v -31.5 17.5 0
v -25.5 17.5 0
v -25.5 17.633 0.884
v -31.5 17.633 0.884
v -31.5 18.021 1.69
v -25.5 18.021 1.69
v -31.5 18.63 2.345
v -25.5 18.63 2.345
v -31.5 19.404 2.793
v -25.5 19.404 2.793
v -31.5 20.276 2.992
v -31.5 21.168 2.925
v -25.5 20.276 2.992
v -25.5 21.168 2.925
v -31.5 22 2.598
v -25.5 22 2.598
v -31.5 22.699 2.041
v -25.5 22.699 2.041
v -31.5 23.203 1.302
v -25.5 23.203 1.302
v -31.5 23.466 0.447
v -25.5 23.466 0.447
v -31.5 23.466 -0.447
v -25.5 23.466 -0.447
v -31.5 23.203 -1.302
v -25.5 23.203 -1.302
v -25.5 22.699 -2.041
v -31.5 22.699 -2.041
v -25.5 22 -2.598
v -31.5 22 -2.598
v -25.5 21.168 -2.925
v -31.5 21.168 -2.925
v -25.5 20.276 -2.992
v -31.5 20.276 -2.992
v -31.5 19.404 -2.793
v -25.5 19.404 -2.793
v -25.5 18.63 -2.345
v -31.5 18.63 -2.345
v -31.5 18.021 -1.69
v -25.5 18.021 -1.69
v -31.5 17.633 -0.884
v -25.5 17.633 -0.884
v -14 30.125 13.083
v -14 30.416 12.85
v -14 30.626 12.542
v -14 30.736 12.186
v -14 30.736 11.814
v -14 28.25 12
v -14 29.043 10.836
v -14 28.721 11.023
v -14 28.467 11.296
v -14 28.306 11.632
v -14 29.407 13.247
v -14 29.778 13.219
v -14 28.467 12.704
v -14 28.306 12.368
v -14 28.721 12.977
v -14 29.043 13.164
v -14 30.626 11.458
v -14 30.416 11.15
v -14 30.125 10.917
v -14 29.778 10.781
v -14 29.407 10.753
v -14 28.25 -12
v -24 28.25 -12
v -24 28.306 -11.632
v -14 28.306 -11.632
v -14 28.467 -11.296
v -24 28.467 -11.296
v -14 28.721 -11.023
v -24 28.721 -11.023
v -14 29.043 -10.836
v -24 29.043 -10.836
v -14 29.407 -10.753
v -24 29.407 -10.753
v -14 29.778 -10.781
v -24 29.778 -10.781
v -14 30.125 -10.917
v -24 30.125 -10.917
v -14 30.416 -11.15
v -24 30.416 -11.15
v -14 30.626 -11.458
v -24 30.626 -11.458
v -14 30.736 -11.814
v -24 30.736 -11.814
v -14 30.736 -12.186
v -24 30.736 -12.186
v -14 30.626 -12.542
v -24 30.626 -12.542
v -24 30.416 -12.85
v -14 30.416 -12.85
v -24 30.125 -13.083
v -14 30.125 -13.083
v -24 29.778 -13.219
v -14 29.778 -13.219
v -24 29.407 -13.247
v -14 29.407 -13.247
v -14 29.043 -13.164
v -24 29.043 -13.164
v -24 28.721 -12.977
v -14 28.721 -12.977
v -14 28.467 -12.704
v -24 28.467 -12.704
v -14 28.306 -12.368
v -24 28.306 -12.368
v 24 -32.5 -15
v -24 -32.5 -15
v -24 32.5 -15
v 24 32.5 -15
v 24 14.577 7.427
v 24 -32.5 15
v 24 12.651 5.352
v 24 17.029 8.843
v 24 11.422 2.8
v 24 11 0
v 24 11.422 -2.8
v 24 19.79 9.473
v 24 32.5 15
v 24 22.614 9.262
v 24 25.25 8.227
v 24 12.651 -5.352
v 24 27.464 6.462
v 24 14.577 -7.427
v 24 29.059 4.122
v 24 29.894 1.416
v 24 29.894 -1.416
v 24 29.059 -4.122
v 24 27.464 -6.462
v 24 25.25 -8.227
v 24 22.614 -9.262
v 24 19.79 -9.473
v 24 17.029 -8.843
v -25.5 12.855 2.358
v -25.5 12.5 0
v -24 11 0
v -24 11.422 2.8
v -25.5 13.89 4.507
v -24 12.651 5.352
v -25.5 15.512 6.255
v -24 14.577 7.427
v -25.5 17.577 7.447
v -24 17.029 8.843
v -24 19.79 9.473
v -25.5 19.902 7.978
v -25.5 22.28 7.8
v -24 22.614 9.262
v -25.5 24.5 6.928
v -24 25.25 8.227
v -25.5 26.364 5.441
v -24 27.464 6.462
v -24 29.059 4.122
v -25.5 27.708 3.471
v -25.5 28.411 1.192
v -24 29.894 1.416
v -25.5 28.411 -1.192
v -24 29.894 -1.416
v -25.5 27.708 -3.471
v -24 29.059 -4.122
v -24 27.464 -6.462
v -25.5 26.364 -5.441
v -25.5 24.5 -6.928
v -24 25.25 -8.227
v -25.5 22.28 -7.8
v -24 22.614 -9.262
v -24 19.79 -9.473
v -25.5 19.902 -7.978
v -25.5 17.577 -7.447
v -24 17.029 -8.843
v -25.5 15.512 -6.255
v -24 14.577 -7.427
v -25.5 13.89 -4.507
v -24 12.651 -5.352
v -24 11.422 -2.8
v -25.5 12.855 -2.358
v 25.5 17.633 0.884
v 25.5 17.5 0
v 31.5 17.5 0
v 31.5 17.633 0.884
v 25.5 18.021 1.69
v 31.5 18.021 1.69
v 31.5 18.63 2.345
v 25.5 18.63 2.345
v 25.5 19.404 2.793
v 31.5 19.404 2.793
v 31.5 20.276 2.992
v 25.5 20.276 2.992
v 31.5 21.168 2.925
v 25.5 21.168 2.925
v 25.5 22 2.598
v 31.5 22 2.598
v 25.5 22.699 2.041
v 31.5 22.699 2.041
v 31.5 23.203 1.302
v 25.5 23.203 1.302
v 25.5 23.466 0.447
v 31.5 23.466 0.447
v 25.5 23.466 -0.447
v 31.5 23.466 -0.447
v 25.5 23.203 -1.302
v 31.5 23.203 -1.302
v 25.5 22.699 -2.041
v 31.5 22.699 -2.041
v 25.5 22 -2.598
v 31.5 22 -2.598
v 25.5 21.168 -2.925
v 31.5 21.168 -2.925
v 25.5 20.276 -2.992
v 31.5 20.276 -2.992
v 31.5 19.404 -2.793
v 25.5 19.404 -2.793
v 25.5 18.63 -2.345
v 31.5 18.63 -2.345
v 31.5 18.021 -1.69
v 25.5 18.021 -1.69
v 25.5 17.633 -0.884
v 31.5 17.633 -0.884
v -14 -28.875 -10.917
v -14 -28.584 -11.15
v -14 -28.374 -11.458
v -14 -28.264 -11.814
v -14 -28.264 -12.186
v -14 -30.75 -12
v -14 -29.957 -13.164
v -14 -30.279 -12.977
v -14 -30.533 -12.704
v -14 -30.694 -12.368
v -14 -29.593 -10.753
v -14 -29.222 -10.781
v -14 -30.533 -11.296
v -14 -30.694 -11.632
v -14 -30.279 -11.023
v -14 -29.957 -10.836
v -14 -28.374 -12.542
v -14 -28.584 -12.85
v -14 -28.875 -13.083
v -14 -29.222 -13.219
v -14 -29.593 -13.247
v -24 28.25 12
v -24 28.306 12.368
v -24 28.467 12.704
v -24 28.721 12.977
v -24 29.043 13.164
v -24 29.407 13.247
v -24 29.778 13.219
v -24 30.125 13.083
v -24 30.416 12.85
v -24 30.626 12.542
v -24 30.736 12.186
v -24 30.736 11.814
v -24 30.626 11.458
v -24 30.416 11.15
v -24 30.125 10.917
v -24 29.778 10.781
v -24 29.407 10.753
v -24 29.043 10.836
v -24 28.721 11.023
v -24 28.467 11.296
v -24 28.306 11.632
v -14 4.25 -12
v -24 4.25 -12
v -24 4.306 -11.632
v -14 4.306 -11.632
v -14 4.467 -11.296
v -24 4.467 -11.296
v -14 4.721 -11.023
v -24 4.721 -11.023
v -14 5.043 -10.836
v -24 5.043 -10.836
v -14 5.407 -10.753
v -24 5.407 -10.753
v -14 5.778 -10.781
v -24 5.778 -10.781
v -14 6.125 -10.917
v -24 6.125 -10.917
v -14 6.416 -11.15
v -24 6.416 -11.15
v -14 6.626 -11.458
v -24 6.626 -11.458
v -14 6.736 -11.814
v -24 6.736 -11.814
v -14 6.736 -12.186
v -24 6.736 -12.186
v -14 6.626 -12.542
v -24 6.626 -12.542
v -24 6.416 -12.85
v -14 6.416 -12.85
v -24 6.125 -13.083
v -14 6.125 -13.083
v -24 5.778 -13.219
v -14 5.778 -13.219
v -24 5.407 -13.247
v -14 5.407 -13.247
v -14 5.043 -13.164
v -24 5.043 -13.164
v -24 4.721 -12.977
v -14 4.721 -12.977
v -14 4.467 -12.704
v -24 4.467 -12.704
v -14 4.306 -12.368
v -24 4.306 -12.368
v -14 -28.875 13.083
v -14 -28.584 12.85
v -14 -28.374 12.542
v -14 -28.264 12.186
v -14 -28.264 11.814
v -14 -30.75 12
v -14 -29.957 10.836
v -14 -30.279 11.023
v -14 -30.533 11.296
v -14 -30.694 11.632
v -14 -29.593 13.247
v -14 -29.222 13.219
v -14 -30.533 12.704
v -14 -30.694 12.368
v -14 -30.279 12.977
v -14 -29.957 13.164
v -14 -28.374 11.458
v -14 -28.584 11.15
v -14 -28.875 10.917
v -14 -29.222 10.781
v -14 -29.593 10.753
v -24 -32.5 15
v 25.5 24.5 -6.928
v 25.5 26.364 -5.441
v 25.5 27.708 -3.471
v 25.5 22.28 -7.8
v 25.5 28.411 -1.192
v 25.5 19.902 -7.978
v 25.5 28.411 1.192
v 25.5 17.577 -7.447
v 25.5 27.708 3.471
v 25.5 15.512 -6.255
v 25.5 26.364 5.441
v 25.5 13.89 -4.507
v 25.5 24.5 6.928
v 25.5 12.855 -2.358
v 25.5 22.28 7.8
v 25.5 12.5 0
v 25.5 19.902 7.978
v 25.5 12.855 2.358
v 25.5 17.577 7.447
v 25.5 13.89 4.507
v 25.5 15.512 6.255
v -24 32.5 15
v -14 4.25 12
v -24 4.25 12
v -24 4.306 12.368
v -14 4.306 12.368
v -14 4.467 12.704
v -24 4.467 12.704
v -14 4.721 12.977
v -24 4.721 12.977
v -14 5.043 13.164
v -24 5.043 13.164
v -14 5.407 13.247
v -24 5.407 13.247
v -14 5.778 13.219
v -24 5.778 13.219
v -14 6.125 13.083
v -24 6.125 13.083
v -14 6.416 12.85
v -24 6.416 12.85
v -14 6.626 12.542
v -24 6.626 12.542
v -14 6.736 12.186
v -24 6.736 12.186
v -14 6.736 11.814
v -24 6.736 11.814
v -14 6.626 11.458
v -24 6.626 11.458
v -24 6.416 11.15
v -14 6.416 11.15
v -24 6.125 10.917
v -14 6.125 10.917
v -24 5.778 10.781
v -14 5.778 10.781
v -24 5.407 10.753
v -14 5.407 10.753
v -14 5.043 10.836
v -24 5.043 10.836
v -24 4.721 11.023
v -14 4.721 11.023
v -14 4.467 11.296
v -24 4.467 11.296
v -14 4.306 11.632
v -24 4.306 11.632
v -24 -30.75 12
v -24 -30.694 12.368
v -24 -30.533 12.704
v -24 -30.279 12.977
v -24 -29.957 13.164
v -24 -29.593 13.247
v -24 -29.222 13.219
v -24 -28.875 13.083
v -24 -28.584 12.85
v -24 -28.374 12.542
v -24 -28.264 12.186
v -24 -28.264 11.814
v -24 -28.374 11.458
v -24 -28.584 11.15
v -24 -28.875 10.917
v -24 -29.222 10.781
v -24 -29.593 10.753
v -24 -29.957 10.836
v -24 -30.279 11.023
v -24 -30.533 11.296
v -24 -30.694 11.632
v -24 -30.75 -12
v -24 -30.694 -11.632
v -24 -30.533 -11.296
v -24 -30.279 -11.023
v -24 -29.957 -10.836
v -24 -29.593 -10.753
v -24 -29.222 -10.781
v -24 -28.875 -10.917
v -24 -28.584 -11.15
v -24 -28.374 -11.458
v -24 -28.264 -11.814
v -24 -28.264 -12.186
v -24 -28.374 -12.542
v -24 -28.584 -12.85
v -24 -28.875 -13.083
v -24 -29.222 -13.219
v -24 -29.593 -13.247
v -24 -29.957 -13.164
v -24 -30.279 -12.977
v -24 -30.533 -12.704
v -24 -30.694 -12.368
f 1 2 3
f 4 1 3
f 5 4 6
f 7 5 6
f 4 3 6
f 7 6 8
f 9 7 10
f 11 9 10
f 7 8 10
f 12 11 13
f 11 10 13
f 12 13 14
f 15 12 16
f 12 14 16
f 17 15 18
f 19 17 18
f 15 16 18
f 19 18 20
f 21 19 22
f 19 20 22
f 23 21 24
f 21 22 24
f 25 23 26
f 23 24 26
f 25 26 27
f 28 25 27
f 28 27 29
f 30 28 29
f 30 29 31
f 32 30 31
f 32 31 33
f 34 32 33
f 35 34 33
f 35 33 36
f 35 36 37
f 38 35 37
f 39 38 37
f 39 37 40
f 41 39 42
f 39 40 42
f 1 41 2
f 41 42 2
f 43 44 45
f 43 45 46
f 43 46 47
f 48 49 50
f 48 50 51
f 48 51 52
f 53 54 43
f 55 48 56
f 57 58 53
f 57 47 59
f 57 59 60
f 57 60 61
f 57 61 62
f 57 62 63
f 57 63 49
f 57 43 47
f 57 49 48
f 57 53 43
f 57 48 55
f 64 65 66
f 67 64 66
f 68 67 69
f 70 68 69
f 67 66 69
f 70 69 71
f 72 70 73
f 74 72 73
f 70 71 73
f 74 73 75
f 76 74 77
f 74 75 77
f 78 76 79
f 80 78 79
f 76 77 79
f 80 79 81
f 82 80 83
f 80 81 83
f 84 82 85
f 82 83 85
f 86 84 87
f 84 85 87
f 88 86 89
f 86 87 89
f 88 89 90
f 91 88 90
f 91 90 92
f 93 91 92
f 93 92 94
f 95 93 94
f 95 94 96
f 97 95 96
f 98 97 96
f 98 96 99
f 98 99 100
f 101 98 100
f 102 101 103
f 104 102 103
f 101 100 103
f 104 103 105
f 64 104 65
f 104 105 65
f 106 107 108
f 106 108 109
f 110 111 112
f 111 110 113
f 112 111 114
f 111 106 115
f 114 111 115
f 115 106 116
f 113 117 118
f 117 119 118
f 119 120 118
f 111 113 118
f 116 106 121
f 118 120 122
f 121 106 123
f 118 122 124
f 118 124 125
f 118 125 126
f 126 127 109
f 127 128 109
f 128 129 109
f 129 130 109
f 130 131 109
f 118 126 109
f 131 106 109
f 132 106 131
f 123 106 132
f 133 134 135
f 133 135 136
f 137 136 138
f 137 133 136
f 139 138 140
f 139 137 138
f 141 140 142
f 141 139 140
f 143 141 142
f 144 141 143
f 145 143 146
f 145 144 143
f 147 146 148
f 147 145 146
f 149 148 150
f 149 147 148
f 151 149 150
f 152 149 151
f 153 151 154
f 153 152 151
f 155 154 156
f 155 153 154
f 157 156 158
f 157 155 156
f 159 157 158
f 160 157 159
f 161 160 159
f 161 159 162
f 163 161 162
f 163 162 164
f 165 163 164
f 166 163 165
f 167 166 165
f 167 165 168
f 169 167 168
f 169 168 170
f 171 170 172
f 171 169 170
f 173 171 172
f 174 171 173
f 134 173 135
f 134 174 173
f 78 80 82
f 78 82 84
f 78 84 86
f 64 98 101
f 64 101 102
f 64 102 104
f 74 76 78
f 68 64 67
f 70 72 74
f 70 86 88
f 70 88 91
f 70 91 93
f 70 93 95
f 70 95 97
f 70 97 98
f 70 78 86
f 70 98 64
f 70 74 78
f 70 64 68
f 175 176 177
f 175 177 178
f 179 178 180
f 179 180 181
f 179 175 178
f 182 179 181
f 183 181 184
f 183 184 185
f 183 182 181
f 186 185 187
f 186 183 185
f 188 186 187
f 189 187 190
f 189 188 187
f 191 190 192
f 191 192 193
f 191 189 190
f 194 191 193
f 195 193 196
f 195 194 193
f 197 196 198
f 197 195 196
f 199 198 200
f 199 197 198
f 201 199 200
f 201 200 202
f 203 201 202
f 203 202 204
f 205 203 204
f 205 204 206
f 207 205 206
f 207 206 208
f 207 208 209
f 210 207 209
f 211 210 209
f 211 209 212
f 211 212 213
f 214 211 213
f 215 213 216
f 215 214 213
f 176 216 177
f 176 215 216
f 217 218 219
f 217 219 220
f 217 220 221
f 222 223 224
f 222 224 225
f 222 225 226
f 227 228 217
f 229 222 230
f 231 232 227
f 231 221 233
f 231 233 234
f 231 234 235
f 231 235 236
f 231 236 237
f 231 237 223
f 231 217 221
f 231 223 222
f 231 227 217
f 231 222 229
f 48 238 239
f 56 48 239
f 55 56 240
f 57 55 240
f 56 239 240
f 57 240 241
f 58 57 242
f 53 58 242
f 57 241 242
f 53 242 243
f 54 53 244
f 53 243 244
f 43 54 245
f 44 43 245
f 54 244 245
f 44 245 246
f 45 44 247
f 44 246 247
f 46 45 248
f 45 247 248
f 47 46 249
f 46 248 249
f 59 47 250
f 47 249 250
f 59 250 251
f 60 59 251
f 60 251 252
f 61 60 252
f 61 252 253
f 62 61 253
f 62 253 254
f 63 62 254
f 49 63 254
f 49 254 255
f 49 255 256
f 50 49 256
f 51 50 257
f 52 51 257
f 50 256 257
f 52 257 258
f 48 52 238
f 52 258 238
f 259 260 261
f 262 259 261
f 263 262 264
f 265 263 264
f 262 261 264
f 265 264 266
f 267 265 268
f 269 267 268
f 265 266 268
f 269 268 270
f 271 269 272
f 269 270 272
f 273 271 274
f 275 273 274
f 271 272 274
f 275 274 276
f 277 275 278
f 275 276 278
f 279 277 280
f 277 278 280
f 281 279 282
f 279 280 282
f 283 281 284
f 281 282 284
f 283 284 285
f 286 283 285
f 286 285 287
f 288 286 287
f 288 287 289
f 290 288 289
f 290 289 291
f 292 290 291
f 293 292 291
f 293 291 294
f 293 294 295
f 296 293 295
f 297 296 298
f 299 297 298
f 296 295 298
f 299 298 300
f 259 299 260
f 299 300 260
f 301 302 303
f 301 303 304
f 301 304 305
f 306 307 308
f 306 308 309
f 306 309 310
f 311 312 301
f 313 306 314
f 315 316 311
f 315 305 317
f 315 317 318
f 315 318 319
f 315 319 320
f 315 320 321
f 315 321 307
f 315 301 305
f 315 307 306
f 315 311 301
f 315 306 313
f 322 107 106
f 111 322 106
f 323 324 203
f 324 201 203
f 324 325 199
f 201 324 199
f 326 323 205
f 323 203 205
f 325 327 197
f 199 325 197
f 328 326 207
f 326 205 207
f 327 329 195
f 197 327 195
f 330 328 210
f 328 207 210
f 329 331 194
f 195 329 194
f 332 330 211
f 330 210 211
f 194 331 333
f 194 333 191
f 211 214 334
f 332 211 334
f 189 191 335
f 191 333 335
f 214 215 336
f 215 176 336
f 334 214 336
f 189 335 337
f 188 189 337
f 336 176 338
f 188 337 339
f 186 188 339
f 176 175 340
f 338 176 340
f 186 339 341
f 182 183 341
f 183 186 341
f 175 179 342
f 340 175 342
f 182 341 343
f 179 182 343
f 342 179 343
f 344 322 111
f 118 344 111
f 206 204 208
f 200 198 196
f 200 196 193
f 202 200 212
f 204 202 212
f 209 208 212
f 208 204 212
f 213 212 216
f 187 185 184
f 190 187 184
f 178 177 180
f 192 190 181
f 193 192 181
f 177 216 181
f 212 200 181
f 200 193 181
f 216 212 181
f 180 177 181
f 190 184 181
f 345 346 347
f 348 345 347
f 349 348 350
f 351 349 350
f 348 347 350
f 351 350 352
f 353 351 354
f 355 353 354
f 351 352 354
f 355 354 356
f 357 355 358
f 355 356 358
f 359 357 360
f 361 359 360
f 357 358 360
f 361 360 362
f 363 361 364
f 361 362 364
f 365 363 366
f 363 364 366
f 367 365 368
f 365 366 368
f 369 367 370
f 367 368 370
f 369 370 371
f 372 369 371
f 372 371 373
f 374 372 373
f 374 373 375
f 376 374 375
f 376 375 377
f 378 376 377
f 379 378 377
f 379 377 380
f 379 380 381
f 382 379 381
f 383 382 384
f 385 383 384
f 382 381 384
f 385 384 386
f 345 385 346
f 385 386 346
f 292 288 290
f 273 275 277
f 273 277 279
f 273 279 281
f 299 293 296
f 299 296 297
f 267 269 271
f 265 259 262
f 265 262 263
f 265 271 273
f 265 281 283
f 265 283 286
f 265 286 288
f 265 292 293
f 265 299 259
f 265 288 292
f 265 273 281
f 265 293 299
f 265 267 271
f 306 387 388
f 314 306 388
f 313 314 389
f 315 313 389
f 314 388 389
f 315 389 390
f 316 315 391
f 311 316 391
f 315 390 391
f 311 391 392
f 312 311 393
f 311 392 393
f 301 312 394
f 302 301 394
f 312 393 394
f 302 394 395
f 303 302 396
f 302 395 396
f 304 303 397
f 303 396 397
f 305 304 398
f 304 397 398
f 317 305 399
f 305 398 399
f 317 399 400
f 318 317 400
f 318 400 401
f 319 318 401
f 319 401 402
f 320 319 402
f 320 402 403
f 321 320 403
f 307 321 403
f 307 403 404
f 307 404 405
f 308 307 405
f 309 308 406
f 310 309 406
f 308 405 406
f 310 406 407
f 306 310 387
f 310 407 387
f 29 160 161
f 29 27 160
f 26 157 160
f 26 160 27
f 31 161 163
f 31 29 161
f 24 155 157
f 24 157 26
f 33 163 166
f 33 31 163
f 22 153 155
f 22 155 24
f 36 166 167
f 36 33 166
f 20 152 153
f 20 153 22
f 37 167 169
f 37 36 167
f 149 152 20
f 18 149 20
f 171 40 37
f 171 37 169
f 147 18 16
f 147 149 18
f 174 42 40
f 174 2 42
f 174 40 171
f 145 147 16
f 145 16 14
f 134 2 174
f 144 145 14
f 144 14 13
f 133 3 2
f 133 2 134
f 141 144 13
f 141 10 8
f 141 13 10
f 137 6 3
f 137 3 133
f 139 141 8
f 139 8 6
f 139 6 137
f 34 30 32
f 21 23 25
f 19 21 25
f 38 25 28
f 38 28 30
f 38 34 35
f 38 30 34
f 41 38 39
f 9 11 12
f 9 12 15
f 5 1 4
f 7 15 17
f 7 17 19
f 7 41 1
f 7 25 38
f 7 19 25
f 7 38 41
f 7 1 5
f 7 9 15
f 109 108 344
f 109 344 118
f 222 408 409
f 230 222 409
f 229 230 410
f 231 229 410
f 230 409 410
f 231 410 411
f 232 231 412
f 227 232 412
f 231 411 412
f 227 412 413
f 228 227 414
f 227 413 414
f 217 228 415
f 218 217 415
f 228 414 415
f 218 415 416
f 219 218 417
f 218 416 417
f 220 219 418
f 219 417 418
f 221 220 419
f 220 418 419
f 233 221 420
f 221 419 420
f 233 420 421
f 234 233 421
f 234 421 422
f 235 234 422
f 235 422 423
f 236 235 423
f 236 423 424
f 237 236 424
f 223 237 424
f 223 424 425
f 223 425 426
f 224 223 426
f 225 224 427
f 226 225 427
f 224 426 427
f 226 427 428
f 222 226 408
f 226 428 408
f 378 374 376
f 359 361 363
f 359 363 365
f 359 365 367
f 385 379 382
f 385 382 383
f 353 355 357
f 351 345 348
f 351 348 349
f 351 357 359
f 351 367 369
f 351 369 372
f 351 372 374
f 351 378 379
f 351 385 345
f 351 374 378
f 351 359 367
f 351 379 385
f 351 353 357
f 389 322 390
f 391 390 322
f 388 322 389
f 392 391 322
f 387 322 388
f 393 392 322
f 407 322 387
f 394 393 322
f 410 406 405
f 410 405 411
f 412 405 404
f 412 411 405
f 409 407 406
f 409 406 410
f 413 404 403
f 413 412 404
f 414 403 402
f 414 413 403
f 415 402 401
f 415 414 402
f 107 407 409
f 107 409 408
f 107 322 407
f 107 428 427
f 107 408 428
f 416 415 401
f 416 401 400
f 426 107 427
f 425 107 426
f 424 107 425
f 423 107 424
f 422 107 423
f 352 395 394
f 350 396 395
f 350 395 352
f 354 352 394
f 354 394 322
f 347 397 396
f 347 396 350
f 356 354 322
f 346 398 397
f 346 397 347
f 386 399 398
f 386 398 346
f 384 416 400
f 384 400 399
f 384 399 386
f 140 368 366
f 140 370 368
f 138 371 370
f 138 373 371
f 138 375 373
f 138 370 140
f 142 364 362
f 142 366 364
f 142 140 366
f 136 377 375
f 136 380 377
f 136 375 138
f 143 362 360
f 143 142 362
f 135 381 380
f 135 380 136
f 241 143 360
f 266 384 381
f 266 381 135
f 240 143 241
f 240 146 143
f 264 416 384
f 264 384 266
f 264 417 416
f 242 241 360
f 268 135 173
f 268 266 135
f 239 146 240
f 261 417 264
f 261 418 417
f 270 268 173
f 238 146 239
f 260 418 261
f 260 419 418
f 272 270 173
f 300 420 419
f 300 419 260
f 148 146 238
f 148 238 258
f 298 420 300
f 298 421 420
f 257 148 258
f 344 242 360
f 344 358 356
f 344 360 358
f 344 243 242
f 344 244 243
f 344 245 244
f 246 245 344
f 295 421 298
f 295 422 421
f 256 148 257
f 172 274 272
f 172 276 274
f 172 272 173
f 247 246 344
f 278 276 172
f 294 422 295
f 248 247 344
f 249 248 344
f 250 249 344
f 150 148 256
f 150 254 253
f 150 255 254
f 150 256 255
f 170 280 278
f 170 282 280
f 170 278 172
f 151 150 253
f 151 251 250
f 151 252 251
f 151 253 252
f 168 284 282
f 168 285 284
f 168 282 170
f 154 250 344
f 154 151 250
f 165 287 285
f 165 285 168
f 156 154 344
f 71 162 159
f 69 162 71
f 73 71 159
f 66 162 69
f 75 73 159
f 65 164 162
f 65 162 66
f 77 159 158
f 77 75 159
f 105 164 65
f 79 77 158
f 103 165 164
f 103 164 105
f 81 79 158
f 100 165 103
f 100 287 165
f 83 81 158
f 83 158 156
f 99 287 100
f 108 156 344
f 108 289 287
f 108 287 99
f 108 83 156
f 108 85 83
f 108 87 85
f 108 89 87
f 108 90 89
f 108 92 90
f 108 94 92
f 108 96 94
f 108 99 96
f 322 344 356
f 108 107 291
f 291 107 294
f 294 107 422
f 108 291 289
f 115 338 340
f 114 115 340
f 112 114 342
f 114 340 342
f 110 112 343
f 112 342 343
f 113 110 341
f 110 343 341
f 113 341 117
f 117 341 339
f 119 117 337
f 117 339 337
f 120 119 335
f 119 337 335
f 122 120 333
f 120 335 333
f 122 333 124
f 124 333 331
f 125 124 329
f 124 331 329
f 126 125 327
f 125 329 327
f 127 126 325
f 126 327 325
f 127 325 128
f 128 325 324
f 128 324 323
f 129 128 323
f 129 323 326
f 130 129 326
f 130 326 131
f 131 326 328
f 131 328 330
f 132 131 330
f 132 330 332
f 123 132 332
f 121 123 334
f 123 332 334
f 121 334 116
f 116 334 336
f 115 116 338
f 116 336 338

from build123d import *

# Parameters (mm, degrees)
BOSS_EXTRUDE1_DEPTH      = 15
BOSS_EXTRUDE1_DEPTH_BACK = 15
SKETCH1_W                = 48
SKETCH1_H                = 65
SKETCH2_R                = 1.25
CUT_EXTRUDE1_DEPTH       = 10
SKETCH4_R                = 9.5
SKETCH4_R_2              = 8
SKETCH4_R_3              = 3
BOSS_EXTRUDE3_DEPTH      = 1.5
CHAMFER2_SIZE            = 1.5
SKETCH5_R                = 3
BOSS_EXTRUDE4_DEPTH      = 6
CHAMFER2_OF_MIRROR1_SIZE = 1.5


with BuildPart() as part:
    # Sketch1 → Boss-Extrude1 (new, two sides: drawn at the far end of the back side and taken through both)
    with BuildSketch(Plane.XY.offset(-BOSS_EXTRUDE1_DEPTH_BACK)):
        Rectangle(SKETCH1_W, SKETCH1_H)
    extrude(amount=BOSS_EXTRUDE1_DEPTH + BOSS_EXTRUDE1_DEPTH_BACK)

    # Sketch2 → Cut-Extrude1 (cut)
    with BuildSketch(Plane.ZY.offset(24)):
        with Locations(Location((-12, 29.5, 0), (0, 0, 270))):
            Circle(SKETCH2_R)
        with Locations(Location((12, 29.5, 0), (0, 0, 270))):
            Circle(SKETCH2_R)
        with Locations(Location((12, 5.5, 0), (0, 0, 270))):
            Circle(SKETCH2_R)
        with Locations(Location((-12, 5.5, 0), (0, 0, 270))):
            Circle(SKETCH2_R)
        with Locations(Location((-12, -29.5, 0), (0, 0, 270))):
            Circle(SKETCH2_R)
        with Locations(Location((12, -29.5, 0), (0, 0, 270))):
            Circle(SKETCH2_R)
    extrude(amount=-CUT_EXTRUDE1_DEPTH, mode=Mode.SUBTRACT)

    # Sketch4 → Boss-Extrude3 (add)
    # profile 1 of 3: a face of its own
    with BuildSketch(Plane.ZY.offset(24)):
        with Locations(Location((0, 20.5, 0), (0, 0, 270))):
            Circle(SKETCH4_R)
        with Locations((0, 20.5)):
            Circle(SKETCH4_R_2, mode=Mode.SUBTRACT)
    # profile 2 of 3: a face of its own
    with BuildSketch(Plane.ZY.offset(24)):
        with Locations((0, 20.5)):
            Circle(SKETCH4_R_2)
        with Locations((0, 20.5)):
            Circle(SKETCH4_R_3, mode=Mode.SUBTRACT)
    # profile 3 of 3: a face of its own
    with BuildSketch(Plane.ZY.offset(24)):
        with Locations((0, 20.5)):
            Circle(SKETCH4_R_3)
    boss_extrude3 = extrude(amount=BOSS_EXTRUDE3_DEPTH)

    # Chamfer2
    chamfer2_edges = [part.edges().sort_by_distance(p)[0] for p in [
        (-25.5, 30, 0),
    ]]
    chamfer(chamfer2_edges, length=CHAMFER2_SIZE - 0.0001)  # a hair under: the kernel refuses the full size

    # Sketch5 → Boss-Extrude4 (add)
    with BuildSketch(Plane.ZY.offset(25.5)):
        with Locations(Location((0, 20.5, 0), (0, 0, 270))):
            Circle(SKETCH5_R)
    boss_extrude4 = extrude(amount=BOSS_EXTRUDE4_DEPTH)

    # Mirror1: Boss-Extrude3, Boss-Extrude4 across plane
    add(boss_extrude3.mirror(Plane(origin=(0, 0, 0), x_dir=(0, 0, 1), z_dir=(1, 0, 0))))
    add(boss_extrude4.mirror(Plane(origin=(0, 0, 0), x_dir=(0, 0, 1), z_dir=(1, 0, 0))))

    # Chamfer2 of Mirror1
    chamfer2_of_mirror1_edges = [part.edges().sort_by_distance(p)[0] for p in [
        (25.5, 30, 0),
    ]]
    chamfer(chamfer2_of_mirror1_edges, length=CHAMFER2_OF_MIRROR1_SIZE - 0.0001)  # a hair under: the kernel refuses the full size


solid = part.part
